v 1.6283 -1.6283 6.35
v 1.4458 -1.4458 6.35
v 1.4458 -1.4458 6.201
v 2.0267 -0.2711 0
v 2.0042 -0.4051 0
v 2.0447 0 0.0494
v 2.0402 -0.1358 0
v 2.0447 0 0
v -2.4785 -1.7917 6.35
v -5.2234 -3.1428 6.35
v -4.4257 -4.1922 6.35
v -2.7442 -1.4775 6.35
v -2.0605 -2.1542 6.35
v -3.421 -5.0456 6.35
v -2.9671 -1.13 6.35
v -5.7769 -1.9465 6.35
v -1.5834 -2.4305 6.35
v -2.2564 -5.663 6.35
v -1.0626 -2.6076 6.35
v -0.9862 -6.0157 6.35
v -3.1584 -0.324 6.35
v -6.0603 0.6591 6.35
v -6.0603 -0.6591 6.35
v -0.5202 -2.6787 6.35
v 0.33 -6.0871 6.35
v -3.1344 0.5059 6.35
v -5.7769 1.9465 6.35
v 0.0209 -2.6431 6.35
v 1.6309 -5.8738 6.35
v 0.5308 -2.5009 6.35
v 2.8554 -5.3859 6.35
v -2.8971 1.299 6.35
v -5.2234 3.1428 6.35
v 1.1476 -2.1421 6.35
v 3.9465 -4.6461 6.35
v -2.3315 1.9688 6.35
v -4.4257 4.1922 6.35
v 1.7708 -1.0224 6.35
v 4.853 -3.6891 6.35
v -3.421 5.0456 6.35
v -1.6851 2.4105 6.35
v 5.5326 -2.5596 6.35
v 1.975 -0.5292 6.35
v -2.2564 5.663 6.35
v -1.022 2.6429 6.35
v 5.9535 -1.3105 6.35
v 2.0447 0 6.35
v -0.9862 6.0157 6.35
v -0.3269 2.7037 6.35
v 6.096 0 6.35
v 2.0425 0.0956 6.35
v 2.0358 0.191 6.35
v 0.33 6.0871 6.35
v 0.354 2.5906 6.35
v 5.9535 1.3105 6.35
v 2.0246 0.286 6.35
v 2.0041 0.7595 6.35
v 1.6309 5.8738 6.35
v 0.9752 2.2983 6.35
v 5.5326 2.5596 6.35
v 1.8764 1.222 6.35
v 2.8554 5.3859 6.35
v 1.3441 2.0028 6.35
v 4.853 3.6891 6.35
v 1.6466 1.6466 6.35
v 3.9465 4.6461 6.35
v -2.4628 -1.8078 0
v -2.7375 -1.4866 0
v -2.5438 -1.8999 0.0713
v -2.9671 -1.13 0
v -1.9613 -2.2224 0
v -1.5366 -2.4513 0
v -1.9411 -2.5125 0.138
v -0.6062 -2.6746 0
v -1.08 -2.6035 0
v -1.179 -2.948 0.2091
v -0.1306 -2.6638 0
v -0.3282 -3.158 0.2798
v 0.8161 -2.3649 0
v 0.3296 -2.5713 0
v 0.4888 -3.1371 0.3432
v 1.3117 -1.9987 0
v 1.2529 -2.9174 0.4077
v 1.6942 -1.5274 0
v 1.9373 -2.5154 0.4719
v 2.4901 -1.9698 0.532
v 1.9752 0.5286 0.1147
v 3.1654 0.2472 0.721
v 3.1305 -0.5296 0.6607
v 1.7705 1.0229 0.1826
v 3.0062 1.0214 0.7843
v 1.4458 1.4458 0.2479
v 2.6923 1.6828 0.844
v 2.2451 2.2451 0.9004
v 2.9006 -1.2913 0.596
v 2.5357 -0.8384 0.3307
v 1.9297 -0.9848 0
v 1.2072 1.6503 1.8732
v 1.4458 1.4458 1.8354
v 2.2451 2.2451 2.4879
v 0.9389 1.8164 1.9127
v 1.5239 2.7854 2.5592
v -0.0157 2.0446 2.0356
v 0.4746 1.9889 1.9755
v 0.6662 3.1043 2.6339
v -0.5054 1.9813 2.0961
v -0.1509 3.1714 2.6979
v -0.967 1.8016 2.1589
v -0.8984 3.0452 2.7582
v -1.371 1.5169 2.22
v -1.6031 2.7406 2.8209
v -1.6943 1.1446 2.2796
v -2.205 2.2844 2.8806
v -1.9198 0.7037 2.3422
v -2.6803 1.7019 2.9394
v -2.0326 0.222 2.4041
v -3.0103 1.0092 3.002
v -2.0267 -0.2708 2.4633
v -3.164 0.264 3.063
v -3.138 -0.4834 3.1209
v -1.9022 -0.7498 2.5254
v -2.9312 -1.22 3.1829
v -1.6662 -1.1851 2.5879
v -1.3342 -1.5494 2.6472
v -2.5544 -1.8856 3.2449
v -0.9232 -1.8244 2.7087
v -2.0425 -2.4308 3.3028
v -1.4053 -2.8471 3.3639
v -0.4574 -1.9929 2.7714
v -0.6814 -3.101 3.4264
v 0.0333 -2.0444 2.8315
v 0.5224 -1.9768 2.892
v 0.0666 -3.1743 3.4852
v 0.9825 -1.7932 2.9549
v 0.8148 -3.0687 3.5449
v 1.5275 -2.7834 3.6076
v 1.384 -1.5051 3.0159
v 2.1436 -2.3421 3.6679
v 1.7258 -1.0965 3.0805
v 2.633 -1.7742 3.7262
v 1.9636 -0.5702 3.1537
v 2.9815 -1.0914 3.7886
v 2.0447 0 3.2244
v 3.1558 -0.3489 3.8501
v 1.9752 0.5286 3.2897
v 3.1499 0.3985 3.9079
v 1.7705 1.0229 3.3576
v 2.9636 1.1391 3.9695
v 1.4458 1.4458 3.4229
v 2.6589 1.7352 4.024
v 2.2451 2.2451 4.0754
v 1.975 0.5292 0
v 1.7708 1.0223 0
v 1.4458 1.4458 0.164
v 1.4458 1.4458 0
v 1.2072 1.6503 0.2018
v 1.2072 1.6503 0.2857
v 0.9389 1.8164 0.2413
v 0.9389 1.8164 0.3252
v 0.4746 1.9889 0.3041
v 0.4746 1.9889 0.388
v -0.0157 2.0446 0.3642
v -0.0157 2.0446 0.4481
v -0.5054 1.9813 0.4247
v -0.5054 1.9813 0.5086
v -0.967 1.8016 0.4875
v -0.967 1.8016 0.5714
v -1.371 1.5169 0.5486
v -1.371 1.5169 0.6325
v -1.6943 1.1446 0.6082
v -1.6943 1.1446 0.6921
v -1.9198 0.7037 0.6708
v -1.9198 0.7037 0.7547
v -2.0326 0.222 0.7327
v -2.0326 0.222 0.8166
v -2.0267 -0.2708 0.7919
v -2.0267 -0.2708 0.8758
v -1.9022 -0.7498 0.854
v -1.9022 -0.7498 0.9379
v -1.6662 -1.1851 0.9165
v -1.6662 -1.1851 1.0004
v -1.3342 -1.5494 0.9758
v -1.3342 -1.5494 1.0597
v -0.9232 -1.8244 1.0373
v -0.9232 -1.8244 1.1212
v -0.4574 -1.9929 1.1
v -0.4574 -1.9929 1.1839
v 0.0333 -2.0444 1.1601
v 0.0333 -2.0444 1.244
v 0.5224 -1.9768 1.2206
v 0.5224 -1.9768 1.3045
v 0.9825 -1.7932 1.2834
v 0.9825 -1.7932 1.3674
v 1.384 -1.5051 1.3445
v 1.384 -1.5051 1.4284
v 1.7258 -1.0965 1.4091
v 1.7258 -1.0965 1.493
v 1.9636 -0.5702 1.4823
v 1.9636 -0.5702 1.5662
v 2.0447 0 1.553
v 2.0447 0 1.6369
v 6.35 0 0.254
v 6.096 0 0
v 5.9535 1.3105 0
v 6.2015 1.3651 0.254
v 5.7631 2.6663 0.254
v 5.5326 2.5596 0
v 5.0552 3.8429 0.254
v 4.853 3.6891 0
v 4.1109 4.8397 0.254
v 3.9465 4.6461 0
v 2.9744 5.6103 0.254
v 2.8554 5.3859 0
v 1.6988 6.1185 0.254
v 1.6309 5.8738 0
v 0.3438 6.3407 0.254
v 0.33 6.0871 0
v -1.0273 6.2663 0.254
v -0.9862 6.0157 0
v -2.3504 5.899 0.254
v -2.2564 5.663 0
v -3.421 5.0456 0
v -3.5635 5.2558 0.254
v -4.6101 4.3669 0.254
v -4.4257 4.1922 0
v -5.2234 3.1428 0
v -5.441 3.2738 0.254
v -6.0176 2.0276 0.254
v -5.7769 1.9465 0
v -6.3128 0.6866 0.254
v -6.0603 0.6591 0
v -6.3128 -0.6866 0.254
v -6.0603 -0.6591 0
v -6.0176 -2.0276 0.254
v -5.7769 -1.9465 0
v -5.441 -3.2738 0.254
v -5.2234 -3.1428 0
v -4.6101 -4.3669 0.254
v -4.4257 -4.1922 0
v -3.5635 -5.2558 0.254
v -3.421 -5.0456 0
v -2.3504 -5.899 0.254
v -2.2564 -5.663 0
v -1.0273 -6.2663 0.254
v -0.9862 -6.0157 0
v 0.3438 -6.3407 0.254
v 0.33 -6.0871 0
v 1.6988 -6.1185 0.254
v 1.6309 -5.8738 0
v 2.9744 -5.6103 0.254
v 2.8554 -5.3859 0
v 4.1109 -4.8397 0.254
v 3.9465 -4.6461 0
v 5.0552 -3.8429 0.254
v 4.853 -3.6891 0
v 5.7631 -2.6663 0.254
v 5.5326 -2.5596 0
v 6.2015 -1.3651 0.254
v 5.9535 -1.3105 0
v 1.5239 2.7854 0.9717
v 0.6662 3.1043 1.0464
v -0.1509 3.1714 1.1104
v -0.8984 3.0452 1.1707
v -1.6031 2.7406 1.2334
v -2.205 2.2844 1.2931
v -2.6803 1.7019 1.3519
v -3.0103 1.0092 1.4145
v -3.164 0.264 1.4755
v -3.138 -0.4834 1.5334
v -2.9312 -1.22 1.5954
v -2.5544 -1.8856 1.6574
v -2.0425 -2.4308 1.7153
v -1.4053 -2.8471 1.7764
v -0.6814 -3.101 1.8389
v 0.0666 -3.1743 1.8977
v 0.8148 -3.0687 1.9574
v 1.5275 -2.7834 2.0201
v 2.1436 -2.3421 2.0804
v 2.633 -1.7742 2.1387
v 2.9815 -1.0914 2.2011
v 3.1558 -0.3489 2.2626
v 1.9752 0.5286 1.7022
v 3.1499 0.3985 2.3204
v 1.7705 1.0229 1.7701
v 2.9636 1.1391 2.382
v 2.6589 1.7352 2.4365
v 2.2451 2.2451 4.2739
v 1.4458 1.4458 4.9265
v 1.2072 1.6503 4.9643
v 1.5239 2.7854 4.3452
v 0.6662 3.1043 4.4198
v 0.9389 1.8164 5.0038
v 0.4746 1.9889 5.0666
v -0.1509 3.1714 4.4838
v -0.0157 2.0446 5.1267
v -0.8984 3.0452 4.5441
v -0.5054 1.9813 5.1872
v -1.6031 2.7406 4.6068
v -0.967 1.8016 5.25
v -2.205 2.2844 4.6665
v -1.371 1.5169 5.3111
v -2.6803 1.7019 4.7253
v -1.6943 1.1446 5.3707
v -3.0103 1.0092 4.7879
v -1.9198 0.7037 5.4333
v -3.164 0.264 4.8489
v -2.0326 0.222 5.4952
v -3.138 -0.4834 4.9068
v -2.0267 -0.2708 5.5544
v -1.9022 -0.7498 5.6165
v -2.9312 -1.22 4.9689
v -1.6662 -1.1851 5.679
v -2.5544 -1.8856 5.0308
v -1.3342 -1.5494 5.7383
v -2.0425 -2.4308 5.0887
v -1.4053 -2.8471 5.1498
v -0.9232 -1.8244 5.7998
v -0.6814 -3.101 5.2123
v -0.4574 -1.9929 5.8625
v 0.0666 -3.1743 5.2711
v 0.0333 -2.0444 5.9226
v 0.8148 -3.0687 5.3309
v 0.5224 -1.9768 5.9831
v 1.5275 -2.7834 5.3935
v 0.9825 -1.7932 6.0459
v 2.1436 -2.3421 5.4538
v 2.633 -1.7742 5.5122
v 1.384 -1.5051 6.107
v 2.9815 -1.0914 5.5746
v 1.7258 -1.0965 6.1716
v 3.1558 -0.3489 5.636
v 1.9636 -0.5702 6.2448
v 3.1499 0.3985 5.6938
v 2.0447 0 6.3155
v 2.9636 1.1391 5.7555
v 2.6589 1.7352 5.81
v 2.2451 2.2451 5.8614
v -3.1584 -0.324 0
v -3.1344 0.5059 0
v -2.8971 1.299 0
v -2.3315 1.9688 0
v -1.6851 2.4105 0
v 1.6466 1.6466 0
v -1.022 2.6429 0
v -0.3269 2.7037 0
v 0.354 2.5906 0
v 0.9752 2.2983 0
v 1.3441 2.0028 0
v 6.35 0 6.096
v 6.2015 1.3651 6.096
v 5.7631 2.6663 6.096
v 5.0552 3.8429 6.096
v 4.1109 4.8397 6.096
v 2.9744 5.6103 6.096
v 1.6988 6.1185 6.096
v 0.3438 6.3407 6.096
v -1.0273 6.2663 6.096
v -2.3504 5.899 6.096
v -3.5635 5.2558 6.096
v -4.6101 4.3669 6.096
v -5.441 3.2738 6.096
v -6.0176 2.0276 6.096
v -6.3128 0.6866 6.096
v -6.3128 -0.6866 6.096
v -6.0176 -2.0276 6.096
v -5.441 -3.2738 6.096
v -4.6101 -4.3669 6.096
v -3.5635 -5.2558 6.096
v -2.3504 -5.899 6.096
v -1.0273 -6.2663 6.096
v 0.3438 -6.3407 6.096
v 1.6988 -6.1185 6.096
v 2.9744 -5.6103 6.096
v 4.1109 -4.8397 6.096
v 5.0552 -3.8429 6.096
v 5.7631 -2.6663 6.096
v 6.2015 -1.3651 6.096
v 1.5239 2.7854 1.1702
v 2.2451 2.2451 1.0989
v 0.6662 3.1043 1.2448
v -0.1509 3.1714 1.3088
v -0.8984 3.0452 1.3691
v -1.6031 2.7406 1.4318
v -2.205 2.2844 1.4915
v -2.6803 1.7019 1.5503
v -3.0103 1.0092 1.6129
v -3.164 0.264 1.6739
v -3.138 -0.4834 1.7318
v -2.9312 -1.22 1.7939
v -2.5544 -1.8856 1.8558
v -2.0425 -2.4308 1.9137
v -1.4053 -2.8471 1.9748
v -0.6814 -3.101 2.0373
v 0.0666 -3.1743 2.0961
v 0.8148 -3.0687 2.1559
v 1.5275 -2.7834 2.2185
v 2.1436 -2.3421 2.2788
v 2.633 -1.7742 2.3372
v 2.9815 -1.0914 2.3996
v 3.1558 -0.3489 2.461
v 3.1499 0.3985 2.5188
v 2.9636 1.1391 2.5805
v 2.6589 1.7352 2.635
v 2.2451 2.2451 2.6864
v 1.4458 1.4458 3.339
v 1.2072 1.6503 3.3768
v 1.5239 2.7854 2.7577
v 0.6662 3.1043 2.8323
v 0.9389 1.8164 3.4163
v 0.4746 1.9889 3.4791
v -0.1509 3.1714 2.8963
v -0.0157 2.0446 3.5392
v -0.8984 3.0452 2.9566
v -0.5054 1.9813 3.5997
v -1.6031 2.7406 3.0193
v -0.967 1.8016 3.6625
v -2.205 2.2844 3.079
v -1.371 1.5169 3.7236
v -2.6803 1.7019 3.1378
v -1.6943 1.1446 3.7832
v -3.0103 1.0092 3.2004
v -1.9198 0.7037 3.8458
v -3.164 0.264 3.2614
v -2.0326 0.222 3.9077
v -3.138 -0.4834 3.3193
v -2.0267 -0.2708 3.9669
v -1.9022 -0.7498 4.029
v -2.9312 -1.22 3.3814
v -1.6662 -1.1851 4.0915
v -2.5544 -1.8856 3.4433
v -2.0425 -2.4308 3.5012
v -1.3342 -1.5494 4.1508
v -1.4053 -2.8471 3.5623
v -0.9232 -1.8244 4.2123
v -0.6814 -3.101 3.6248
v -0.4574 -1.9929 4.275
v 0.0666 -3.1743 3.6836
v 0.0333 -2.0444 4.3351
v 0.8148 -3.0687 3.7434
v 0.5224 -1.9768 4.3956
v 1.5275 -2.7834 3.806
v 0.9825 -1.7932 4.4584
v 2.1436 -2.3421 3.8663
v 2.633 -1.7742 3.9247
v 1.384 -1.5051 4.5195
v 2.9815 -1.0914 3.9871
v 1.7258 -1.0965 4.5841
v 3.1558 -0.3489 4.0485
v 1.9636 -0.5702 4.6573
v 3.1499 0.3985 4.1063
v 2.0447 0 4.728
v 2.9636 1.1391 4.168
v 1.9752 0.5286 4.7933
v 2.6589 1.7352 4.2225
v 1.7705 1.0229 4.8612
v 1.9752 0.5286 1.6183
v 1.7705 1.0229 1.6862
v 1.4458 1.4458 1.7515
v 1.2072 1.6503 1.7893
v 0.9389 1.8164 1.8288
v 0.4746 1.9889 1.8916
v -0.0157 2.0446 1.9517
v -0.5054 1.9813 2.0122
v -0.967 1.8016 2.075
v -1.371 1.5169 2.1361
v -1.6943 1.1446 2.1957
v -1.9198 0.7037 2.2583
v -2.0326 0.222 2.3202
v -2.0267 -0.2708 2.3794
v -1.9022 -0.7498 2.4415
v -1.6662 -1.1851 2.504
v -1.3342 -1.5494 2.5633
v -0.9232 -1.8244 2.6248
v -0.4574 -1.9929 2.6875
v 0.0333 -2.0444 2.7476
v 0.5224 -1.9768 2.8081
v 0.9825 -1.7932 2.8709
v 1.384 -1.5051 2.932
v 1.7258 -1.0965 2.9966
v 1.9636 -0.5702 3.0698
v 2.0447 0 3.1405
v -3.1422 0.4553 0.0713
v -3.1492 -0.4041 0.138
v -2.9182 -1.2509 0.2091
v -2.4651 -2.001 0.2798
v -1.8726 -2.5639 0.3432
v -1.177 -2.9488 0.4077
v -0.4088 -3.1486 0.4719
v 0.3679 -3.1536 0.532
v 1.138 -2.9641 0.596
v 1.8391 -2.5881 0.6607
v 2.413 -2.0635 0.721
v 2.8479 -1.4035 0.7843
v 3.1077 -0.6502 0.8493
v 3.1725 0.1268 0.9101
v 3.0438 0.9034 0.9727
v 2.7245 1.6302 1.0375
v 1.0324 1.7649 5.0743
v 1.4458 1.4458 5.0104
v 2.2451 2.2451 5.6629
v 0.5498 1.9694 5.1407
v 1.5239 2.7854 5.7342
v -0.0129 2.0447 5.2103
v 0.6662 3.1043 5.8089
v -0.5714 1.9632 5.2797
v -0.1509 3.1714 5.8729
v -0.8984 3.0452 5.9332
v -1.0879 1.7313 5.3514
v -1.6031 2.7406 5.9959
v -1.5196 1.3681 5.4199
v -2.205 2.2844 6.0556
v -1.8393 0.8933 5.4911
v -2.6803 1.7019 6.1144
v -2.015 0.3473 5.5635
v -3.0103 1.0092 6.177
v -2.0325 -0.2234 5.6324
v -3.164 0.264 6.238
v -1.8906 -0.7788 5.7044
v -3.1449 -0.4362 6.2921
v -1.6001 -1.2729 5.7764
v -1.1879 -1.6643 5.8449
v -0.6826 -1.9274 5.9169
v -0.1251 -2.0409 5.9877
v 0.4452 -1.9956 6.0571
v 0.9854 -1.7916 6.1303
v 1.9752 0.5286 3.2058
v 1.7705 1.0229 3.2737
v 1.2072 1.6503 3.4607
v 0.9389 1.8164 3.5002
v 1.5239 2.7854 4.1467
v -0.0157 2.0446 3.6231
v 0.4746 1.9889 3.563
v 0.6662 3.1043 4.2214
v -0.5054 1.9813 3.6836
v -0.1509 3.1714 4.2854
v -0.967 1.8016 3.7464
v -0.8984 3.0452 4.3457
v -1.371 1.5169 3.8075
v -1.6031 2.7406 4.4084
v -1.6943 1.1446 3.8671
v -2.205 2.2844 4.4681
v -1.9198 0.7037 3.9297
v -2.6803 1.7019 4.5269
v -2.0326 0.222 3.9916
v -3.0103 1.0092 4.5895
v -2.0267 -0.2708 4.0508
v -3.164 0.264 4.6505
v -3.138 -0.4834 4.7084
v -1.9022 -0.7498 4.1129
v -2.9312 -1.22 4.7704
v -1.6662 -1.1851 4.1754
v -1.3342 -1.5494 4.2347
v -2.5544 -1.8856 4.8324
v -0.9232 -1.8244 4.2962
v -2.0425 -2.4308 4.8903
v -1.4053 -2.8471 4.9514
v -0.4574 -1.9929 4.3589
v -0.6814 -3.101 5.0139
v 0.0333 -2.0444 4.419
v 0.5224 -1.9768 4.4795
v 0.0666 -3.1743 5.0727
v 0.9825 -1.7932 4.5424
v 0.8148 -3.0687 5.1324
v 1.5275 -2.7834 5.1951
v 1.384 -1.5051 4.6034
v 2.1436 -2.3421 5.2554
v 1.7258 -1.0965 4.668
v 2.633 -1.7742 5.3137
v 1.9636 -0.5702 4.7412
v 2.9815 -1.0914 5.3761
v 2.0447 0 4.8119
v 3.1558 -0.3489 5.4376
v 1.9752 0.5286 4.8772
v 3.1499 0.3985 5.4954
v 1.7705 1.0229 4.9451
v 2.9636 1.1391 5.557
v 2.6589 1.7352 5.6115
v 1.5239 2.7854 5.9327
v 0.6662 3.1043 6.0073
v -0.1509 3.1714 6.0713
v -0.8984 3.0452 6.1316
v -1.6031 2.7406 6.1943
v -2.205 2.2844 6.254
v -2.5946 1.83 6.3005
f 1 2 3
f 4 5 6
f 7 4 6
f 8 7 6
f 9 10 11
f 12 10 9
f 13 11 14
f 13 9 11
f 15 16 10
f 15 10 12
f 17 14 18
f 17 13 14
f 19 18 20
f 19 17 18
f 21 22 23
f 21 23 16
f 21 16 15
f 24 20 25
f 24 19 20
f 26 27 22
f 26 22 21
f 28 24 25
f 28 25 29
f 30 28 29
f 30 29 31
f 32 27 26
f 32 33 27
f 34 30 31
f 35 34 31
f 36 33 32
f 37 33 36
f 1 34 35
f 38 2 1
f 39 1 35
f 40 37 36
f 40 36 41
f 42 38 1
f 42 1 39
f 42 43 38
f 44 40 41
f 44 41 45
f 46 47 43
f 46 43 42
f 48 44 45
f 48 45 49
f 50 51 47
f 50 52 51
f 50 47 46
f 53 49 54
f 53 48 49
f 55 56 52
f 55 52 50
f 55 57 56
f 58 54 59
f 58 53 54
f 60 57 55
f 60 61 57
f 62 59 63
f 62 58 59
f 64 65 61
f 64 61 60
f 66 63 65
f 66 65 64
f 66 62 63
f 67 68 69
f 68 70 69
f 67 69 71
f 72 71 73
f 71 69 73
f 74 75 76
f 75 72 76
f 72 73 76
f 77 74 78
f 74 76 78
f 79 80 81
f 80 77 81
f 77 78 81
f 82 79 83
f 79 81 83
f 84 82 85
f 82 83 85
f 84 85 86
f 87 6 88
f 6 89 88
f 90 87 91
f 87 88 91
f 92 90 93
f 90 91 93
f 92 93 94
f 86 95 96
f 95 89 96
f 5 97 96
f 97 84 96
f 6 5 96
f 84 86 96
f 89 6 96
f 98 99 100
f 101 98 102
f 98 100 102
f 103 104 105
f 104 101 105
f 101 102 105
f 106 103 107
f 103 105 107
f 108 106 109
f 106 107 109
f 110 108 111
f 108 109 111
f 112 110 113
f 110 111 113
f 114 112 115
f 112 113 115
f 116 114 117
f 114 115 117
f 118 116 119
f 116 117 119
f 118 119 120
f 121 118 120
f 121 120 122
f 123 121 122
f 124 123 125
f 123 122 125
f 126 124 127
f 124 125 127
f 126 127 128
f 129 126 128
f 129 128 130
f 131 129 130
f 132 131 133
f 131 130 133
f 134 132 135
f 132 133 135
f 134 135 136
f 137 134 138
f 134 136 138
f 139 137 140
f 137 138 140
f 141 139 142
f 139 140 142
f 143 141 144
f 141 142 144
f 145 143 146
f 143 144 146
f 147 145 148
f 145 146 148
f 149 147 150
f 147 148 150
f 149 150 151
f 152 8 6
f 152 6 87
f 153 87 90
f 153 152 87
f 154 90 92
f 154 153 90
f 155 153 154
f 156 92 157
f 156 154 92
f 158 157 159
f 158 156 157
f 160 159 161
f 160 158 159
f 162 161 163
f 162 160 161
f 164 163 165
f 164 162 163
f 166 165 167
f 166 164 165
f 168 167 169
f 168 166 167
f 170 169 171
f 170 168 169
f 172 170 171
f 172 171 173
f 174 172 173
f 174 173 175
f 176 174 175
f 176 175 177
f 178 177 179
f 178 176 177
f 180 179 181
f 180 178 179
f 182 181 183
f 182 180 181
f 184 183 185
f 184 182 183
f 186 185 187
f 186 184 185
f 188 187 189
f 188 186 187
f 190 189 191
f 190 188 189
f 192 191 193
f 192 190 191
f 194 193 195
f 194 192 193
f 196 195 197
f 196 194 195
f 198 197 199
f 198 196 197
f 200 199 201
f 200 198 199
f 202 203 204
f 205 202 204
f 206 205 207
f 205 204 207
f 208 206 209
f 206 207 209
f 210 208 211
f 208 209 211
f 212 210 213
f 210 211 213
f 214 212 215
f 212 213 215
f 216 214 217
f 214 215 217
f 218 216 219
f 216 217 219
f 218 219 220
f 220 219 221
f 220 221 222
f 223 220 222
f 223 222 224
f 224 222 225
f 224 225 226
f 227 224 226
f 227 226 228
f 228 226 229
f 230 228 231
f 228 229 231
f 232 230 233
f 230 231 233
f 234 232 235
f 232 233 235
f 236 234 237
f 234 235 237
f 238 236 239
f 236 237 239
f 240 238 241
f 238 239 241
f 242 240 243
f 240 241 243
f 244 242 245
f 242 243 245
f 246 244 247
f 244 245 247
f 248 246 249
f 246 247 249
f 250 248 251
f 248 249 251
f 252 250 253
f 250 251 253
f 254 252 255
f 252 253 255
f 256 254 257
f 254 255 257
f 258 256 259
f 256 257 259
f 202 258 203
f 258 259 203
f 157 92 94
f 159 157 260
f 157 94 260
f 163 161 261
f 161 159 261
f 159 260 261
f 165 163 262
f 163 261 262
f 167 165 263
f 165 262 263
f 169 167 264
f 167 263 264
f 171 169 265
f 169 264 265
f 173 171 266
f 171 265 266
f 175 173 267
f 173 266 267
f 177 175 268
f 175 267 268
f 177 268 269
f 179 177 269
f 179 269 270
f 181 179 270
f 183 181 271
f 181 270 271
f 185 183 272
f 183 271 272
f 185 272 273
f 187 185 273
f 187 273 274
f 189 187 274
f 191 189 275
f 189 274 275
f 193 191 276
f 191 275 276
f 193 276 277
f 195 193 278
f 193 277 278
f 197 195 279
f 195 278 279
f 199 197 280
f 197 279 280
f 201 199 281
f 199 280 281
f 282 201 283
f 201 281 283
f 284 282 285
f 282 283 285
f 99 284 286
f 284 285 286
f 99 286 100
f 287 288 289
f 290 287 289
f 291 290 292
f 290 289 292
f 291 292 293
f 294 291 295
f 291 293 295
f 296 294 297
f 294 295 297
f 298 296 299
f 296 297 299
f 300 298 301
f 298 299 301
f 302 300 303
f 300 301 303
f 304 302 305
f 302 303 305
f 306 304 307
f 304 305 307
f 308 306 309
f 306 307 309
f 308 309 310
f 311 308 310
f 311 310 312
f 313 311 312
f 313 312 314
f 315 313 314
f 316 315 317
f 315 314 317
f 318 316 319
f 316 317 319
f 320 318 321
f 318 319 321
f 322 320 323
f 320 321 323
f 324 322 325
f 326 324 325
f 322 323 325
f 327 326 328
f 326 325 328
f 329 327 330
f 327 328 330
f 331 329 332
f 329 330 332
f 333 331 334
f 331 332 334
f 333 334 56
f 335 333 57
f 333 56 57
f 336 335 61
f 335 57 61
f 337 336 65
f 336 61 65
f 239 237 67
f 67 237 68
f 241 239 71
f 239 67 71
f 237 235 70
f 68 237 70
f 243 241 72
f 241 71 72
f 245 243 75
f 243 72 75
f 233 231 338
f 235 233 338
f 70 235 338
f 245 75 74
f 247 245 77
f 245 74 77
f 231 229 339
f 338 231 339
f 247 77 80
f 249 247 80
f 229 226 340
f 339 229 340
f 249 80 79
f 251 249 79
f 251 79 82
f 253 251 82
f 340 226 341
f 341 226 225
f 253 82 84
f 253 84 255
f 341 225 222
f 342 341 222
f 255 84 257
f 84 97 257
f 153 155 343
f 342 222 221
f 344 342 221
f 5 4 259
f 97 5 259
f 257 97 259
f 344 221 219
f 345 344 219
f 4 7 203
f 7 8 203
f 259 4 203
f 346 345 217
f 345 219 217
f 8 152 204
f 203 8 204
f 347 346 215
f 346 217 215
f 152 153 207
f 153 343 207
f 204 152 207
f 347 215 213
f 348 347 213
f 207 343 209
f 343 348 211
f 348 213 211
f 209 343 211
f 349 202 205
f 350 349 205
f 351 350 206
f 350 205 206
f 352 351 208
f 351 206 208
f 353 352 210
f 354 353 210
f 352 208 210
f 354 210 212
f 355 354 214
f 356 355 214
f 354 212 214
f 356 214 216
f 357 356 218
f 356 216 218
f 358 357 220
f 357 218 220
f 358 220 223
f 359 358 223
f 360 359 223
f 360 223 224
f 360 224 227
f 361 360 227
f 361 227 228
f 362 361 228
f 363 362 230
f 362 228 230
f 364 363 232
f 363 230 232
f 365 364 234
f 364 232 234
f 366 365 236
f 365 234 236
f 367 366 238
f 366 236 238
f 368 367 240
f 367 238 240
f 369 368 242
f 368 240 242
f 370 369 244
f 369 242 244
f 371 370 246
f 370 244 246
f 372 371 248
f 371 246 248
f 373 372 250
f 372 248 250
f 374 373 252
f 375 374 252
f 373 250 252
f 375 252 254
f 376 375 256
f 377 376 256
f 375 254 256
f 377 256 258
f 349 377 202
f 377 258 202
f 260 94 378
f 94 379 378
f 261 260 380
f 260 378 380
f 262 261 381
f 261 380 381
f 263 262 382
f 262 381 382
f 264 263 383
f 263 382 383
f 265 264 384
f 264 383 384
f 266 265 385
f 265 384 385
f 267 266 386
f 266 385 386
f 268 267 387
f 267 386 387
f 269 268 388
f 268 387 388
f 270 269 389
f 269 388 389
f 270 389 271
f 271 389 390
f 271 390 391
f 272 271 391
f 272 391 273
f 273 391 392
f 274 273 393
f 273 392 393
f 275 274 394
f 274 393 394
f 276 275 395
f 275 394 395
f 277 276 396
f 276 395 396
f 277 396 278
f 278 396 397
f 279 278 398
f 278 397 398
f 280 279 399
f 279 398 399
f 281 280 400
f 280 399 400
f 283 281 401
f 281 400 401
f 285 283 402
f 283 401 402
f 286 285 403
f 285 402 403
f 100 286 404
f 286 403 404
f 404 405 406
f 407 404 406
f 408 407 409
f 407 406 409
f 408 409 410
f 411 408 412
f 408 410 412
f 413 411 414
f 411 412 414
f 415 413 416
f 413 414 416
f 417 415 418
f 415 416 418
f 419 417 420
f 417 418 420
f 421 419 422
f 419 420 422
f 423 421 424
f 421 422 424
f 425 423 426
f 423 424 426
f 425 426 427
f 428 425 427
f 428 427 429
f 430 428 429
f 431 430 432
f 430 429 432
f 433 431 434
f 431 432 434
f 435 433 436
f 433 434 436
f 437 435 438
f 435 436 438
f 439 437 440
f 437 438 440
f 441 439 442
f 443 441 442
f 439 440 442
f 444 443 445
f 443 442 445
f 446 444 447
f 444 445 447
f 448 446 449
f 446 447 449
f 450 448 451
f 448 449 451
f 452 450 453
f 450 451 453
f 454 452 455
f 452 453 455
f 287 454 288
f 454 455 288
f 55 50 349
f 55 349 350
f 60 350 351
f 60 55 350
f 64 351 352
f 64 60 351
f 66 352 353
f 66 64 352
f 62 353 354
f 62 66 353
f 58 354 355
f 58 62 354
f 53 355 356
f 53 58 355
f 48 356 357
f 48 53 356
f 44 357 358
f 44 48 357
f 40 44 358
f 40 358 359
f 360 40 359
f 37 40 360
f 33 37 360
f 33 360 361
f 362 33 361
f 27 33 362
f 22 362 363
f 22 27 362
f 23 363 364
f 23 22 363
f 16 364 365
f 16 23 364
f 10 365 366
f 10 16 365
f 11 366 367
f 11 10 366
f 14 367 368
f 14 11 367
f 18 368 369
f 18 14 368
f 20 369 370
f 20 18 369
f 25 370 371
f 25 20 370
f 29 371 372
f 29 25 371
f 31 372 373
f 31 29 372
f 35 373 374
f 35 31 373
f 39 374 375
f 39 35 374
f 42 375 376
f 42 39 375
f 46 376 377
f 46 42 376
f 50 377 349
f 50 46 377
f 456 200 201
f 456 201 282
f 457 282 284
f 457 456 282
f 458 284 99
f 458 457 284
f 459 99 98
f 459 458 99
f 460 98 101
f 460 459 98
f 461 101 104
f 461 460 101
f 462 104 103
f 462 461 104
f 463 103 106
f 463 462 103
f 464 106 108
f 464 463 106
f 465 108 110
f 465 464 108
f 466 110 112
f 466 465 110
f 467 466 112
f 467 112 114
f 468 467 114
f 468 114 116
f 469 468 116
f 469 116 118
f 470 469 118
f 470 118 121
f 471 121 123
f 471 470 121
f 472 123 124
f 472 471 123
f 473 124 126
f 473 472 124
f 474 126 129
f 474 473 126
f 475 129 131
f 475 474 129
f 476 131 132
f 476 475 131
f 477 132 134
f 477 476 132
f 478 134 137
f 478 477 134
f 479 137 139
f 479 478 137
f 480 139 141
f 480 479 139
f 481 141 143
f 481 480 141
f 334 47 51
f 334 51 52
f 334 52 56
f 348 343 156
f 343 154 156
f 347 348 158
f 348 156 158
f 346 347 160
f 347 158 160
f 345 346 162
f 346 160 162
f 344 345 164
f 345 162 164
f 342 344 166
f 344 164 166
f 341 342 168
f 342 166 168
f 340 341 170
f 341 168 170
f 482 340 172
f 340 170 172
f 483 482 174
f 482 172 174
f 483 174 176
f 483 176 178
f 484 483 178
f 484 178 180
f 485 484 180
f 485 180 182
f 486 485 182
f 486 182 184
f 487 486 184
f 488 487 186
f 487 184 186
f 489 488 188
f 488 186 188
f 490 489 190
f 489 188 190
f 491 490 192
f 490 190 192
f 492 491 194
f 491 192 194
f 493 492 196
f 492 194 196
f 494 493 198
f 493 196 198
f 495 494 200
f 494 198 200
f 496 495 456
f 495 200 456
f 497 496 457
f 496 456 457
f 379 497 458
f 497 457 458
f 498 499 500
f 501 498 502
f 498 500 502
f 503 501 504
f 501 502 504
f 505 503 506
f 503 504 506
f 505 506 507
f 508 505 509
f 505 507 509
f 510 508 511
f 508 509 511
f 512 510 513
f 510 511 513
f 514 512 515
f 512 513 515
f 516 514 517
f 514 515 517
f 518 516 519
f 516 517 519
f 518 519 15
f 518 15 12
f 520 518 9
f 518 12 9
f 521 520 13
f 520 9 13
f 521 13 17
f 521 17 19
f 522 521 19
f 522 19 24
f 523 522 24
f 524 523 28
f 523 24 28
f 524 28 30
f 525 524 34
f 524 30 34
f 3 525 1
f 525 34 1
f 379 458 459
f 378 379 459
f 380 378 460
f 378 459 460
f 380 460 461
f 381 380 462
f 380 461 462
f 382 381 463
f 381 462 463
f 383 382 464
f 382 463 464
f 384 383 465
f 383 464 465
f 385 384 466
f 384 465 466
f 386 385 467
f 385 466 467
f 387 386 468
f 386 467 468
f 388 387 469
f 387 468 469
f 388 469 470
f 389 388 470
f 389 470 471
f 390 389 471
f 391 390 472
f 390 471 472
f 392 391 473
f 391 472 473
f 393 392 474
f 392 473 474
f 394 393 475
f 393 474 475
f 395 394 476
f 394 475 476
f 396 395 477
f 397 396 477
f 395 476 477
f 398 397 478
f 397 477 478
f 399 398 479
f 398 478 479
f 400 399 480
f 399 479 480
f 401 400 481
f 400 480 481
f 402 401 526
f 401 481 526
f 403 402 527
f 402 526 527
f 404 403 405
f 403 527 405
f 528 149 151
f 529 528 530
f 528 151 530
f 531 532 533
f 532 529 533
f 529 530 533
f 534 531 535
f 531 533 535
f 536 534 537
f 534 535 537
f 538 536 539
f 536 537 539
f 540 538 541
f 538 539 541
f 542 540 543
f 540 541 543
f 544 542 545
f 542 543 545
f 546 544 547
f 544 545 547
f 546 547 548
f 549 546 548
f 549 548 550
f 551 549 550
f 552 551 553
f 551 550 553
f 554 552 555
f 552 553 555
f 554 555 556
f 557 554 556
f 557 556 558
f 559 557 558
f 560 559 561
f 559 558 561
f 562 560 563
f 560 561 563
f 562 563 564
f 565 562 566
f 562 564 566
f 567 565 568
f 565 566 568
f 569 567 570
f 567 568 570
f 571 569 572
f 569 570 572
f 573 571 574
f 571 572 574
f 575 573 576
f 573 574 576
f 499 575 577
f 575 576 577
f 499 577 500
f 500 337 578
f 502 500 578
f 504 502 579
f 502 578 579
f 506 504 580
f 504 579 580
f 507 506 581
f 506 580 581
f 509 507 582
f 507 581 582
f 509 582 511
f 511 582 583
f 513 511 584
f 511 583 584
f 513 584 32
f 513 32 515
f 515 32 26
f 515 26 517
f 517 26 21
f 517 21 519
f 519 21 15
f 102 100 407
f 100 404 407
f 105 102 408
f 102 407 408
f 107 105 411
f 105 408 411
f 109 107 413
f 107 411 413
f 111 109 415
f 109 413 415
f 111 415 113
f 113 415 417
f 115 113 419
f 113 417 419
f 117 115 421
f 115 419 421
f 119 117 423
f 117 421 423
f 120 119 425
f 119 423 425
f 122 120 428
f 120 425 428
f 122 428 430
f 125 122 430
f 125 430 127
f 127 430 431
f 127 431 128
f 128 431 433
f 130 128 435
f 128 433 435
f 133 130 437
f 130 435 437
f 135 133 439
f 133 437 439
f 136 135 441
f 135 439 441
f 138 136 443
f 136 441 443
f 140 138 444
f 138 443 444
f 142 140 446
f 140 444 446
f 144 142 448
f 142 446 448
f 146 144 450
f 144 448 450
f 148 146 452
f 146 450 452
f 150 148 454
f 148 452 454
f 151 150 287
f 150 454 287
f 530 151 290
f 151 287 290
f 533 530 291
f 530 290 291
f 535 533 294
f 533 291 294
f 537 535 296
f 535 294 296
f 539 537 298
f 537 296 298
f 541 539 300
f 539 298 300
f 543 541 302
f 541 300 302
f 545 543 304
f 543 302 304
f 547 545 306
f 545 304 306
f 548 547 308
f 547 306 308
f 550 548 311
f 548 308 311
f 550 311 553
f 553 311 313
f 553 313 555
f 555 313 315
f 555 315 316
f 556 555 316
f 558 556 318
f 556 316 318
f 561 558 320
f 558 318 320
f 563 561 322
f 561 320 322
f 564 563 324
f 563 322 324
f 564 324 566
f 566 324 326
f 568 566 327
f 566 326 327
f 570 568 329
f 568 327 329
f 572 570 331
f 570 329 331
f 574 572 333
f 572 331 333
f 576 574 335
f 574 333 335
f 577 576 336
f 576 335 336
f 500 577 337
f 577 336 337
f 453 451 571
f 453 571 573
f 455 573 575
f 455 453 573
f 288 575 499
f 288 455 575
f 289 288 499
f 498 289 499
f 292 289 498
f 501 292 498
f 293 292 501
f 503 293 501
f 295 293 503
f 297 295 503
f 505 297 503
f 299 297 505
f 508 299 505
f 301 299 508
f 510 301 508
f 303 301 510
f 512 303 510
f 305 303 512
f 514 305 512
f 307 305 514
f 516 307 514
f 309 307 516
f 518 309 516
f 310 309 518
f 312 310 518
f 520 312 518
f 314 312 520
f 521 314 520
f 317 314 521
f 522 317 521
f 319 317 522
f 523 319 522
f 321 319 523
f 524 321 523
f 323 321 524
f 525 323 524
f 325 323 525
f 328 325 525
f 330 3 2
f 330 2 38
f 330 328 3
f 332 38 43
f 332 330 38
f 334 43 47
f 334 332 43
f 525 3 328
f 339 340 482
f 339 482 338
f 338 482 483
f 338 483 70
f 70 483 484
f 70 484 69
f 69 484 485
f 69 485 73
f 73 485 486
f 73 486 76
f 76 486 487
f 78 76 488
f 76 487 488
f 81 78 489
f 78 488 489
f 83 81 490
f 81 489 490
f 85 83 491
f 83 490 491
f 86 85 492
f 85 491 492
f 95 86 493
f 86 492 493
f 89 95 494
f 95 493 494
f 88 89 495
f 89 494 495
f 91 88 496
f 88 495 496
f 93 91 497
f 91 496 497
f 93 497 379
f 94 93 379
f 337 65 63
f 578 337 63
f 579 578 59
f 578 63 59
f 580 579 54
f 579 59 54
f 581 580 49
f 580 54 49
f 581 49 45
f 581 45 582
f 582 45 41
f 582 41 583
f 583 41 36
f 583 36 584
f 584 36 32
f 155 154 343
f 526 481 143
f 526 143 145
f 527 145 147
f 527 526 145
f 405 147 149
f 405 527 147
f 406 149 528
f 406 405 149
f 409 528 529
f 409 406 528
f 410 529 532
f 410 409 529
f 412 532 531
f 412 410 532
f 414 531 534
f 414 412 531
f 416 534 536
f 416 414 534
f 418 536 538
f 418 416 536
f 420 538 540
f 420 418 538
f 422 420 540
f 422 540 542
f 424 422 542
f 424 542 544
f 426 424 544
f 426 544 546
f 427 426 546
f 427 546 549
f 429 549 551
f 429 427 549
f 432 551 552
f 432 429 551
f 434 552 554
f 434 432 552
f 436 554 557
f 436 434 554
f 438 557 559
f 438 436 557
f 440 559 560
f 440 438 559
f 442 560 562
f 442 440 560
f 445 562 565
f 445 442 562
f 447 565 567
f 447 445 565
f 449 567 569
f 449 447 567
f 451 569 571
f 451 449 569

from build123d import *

# Parameters (mm, degrees)
SKETCH1_R           = 6.35
SKETCH1_R_2         = 2.0447
BOSS_EXTRUDE1_DEPTH = 6.35
CUT_SWEEP1_PITCH    = 1.5875
CHAMFER1_SIZE       = 0.254


with BuildPart() as part:
    # Sketch1 → Boss-Extrude1 (new body)
    with BuildSketch(Plane.XY):
        Circle(SKETCH1_R)
        Circle(SKETCH1_R_2, mode=Mode.SUBTRACT)
    extrude(amount=BOSS_EXTRUDE1_DEPTH)

    # Cut-Sweep1: arcs per turn and ends read off the stored shape
    # Cut-Sweep1: the profile of Sketch2 profile screwed along a right-hand helix through 4.75 turns, 8 arcs to a turn; built about Z, then put on its axis
    cut_sweep1_z = Axis((0, 0, 0), (0, 0, 1))
    cut_sweep1_corners = [(2.0444, 0, -1.339811764), (3.175, 0, -0.68705955), (3.175, 0, -0.48862205), (2.0444, 0, 0.164130164)]
    with BuildLine(mode=Mode.PRIVATE) as cut_sweep1_profile:
        Line(cut_sweep1_corners[0], cut_sweep1_corners[1])
        Line(cut_sweep1_corners[1], cut_sweep1_corners[2])
        Line(cut_sweep1_corners[2], cut_sweep1_corners[3])
        Line(cut_sweep1_corners[3], cut_sweep1_corners[0])
    cut_sweep1_cap = Face(cut_sweep1_profile.wire())
    cut_sweep1_turn_angles = [0, 22.5, 45, 67.5, 90, 112.5, 135, 157.5, 180, 202.5, 225, 247.5, 270, 292.5, 315, 337.5, 360]
    cut_sweep1_turn_weights = [1, 0.9238795325112867, 1, 0.9238795325112867, 1, 0.9238795325112867, 1, 0.9238795325112867, 1, 0.9238795325112867, 1, 0.9238795325112867, 1, 0.9238795325112867, 1, 0.9238795325112867, 1]
    cut_sweep1_turn_rails = [Edge.make_bspline([Vector(p[0], p[1], 0).rotate(cut_sweep1_z, cut_sweep1_turn_angles[k]) / cut_sweep1_turn_weights[k] + Vector(0, 0, p[2] + CUT_SWEEP1_PITCH * cut_sweep1_turn_angles[k] / 360) for k in range(17)], [0, 0, 0, 1, 1, 2, 2, 3, 3, 4, 4, 5, 5, 6, 6, 7, 7, 8, 8, 8], 2, cut_sweep1_turn_weights) for p in cut_sweep1_corners]
    cut_sweep1_turn_sides = [Face.make_surface_from_curves(cut_sweep1_turn_rails[p[0]], cut_sweep1_turn_rails[p[1]]) for p in [(0, 1), (1, 2), (2, 3), (3, 0)]]
    cut_sweep1_last_angles = [1440, 1462.5, 1485, 1507.5, 1530, 1552.5, 1575, 1597.5, 1620, 1642.5, 1665, 1687.5, 1710]
    cut_sweep1_last_weights = [1, 0.9238795325112867, 1, 0.9238795325112867, 1, 0.9238795325112867, 1, 0.9238795325112867, 1, 0.9238795325112867, 1, 0.9238795325112769, 1]
    cut_sweep1_last_rails = [Edge.make_bspline([Vector(p[0], p[1], 0).rotate(cut_sweep1_z, cut_sweep1_last_angles[k]) / cut_sweep1_last_weights[k] + Vector(0, 0, p[2] + CUT_SWEEP1_PITCH * cut_sweep1_last_angles[k] / 360) for k in range(13)], [0, 0, 0, 1, 1, 2, 2, 3, 3, 4, 4, 5, 5, 6, 6, 6], 2, cut_sweep1_last_weights) for p in cut_sweep1_corners]
    cut_sweep1_last_sides = [Face.make_surface_from_curves(cut_sweep1_last_rails[p[0]], cut_sweep1_last_rails[p[1]]) for p in [(0, 1), (1, 2), (2, 3), (3, 0)]]
    cut_sweep1 = Plane(origin=(0, 0, 0), x_dir=(0.7071067811865512, 0.7071067811865438, 0), z_dir=(0, 0, 1)) * Solid(Shell([*[p.moved(Location((0, 0, CUT_SWEEP1_PITCH * i))) for i in range(4) for p in cut_sweep1_turn_sides], *cut_sweep1_last_sides, cut_sweep1_cap, cut_sweep1_cap.rotate(cut_sweep1_z, 1710).moved(Location((0, 0, CUT_SWEEP1_PITCH * 1710 / 360)))]))
    add(cut_sweep1, mode=Mode.SUBTRACT)

    # Chamfer1
    chamfer1_edges = [part.edges().sort_by_distance(p)[0] for p in [
        (-6.35, 0, 0),
        (-6.35, 0, 6.35),
    ]]
    chamfer(chamfer1_edges, length=CHAMFER1_SIZE)


solid = part.part
